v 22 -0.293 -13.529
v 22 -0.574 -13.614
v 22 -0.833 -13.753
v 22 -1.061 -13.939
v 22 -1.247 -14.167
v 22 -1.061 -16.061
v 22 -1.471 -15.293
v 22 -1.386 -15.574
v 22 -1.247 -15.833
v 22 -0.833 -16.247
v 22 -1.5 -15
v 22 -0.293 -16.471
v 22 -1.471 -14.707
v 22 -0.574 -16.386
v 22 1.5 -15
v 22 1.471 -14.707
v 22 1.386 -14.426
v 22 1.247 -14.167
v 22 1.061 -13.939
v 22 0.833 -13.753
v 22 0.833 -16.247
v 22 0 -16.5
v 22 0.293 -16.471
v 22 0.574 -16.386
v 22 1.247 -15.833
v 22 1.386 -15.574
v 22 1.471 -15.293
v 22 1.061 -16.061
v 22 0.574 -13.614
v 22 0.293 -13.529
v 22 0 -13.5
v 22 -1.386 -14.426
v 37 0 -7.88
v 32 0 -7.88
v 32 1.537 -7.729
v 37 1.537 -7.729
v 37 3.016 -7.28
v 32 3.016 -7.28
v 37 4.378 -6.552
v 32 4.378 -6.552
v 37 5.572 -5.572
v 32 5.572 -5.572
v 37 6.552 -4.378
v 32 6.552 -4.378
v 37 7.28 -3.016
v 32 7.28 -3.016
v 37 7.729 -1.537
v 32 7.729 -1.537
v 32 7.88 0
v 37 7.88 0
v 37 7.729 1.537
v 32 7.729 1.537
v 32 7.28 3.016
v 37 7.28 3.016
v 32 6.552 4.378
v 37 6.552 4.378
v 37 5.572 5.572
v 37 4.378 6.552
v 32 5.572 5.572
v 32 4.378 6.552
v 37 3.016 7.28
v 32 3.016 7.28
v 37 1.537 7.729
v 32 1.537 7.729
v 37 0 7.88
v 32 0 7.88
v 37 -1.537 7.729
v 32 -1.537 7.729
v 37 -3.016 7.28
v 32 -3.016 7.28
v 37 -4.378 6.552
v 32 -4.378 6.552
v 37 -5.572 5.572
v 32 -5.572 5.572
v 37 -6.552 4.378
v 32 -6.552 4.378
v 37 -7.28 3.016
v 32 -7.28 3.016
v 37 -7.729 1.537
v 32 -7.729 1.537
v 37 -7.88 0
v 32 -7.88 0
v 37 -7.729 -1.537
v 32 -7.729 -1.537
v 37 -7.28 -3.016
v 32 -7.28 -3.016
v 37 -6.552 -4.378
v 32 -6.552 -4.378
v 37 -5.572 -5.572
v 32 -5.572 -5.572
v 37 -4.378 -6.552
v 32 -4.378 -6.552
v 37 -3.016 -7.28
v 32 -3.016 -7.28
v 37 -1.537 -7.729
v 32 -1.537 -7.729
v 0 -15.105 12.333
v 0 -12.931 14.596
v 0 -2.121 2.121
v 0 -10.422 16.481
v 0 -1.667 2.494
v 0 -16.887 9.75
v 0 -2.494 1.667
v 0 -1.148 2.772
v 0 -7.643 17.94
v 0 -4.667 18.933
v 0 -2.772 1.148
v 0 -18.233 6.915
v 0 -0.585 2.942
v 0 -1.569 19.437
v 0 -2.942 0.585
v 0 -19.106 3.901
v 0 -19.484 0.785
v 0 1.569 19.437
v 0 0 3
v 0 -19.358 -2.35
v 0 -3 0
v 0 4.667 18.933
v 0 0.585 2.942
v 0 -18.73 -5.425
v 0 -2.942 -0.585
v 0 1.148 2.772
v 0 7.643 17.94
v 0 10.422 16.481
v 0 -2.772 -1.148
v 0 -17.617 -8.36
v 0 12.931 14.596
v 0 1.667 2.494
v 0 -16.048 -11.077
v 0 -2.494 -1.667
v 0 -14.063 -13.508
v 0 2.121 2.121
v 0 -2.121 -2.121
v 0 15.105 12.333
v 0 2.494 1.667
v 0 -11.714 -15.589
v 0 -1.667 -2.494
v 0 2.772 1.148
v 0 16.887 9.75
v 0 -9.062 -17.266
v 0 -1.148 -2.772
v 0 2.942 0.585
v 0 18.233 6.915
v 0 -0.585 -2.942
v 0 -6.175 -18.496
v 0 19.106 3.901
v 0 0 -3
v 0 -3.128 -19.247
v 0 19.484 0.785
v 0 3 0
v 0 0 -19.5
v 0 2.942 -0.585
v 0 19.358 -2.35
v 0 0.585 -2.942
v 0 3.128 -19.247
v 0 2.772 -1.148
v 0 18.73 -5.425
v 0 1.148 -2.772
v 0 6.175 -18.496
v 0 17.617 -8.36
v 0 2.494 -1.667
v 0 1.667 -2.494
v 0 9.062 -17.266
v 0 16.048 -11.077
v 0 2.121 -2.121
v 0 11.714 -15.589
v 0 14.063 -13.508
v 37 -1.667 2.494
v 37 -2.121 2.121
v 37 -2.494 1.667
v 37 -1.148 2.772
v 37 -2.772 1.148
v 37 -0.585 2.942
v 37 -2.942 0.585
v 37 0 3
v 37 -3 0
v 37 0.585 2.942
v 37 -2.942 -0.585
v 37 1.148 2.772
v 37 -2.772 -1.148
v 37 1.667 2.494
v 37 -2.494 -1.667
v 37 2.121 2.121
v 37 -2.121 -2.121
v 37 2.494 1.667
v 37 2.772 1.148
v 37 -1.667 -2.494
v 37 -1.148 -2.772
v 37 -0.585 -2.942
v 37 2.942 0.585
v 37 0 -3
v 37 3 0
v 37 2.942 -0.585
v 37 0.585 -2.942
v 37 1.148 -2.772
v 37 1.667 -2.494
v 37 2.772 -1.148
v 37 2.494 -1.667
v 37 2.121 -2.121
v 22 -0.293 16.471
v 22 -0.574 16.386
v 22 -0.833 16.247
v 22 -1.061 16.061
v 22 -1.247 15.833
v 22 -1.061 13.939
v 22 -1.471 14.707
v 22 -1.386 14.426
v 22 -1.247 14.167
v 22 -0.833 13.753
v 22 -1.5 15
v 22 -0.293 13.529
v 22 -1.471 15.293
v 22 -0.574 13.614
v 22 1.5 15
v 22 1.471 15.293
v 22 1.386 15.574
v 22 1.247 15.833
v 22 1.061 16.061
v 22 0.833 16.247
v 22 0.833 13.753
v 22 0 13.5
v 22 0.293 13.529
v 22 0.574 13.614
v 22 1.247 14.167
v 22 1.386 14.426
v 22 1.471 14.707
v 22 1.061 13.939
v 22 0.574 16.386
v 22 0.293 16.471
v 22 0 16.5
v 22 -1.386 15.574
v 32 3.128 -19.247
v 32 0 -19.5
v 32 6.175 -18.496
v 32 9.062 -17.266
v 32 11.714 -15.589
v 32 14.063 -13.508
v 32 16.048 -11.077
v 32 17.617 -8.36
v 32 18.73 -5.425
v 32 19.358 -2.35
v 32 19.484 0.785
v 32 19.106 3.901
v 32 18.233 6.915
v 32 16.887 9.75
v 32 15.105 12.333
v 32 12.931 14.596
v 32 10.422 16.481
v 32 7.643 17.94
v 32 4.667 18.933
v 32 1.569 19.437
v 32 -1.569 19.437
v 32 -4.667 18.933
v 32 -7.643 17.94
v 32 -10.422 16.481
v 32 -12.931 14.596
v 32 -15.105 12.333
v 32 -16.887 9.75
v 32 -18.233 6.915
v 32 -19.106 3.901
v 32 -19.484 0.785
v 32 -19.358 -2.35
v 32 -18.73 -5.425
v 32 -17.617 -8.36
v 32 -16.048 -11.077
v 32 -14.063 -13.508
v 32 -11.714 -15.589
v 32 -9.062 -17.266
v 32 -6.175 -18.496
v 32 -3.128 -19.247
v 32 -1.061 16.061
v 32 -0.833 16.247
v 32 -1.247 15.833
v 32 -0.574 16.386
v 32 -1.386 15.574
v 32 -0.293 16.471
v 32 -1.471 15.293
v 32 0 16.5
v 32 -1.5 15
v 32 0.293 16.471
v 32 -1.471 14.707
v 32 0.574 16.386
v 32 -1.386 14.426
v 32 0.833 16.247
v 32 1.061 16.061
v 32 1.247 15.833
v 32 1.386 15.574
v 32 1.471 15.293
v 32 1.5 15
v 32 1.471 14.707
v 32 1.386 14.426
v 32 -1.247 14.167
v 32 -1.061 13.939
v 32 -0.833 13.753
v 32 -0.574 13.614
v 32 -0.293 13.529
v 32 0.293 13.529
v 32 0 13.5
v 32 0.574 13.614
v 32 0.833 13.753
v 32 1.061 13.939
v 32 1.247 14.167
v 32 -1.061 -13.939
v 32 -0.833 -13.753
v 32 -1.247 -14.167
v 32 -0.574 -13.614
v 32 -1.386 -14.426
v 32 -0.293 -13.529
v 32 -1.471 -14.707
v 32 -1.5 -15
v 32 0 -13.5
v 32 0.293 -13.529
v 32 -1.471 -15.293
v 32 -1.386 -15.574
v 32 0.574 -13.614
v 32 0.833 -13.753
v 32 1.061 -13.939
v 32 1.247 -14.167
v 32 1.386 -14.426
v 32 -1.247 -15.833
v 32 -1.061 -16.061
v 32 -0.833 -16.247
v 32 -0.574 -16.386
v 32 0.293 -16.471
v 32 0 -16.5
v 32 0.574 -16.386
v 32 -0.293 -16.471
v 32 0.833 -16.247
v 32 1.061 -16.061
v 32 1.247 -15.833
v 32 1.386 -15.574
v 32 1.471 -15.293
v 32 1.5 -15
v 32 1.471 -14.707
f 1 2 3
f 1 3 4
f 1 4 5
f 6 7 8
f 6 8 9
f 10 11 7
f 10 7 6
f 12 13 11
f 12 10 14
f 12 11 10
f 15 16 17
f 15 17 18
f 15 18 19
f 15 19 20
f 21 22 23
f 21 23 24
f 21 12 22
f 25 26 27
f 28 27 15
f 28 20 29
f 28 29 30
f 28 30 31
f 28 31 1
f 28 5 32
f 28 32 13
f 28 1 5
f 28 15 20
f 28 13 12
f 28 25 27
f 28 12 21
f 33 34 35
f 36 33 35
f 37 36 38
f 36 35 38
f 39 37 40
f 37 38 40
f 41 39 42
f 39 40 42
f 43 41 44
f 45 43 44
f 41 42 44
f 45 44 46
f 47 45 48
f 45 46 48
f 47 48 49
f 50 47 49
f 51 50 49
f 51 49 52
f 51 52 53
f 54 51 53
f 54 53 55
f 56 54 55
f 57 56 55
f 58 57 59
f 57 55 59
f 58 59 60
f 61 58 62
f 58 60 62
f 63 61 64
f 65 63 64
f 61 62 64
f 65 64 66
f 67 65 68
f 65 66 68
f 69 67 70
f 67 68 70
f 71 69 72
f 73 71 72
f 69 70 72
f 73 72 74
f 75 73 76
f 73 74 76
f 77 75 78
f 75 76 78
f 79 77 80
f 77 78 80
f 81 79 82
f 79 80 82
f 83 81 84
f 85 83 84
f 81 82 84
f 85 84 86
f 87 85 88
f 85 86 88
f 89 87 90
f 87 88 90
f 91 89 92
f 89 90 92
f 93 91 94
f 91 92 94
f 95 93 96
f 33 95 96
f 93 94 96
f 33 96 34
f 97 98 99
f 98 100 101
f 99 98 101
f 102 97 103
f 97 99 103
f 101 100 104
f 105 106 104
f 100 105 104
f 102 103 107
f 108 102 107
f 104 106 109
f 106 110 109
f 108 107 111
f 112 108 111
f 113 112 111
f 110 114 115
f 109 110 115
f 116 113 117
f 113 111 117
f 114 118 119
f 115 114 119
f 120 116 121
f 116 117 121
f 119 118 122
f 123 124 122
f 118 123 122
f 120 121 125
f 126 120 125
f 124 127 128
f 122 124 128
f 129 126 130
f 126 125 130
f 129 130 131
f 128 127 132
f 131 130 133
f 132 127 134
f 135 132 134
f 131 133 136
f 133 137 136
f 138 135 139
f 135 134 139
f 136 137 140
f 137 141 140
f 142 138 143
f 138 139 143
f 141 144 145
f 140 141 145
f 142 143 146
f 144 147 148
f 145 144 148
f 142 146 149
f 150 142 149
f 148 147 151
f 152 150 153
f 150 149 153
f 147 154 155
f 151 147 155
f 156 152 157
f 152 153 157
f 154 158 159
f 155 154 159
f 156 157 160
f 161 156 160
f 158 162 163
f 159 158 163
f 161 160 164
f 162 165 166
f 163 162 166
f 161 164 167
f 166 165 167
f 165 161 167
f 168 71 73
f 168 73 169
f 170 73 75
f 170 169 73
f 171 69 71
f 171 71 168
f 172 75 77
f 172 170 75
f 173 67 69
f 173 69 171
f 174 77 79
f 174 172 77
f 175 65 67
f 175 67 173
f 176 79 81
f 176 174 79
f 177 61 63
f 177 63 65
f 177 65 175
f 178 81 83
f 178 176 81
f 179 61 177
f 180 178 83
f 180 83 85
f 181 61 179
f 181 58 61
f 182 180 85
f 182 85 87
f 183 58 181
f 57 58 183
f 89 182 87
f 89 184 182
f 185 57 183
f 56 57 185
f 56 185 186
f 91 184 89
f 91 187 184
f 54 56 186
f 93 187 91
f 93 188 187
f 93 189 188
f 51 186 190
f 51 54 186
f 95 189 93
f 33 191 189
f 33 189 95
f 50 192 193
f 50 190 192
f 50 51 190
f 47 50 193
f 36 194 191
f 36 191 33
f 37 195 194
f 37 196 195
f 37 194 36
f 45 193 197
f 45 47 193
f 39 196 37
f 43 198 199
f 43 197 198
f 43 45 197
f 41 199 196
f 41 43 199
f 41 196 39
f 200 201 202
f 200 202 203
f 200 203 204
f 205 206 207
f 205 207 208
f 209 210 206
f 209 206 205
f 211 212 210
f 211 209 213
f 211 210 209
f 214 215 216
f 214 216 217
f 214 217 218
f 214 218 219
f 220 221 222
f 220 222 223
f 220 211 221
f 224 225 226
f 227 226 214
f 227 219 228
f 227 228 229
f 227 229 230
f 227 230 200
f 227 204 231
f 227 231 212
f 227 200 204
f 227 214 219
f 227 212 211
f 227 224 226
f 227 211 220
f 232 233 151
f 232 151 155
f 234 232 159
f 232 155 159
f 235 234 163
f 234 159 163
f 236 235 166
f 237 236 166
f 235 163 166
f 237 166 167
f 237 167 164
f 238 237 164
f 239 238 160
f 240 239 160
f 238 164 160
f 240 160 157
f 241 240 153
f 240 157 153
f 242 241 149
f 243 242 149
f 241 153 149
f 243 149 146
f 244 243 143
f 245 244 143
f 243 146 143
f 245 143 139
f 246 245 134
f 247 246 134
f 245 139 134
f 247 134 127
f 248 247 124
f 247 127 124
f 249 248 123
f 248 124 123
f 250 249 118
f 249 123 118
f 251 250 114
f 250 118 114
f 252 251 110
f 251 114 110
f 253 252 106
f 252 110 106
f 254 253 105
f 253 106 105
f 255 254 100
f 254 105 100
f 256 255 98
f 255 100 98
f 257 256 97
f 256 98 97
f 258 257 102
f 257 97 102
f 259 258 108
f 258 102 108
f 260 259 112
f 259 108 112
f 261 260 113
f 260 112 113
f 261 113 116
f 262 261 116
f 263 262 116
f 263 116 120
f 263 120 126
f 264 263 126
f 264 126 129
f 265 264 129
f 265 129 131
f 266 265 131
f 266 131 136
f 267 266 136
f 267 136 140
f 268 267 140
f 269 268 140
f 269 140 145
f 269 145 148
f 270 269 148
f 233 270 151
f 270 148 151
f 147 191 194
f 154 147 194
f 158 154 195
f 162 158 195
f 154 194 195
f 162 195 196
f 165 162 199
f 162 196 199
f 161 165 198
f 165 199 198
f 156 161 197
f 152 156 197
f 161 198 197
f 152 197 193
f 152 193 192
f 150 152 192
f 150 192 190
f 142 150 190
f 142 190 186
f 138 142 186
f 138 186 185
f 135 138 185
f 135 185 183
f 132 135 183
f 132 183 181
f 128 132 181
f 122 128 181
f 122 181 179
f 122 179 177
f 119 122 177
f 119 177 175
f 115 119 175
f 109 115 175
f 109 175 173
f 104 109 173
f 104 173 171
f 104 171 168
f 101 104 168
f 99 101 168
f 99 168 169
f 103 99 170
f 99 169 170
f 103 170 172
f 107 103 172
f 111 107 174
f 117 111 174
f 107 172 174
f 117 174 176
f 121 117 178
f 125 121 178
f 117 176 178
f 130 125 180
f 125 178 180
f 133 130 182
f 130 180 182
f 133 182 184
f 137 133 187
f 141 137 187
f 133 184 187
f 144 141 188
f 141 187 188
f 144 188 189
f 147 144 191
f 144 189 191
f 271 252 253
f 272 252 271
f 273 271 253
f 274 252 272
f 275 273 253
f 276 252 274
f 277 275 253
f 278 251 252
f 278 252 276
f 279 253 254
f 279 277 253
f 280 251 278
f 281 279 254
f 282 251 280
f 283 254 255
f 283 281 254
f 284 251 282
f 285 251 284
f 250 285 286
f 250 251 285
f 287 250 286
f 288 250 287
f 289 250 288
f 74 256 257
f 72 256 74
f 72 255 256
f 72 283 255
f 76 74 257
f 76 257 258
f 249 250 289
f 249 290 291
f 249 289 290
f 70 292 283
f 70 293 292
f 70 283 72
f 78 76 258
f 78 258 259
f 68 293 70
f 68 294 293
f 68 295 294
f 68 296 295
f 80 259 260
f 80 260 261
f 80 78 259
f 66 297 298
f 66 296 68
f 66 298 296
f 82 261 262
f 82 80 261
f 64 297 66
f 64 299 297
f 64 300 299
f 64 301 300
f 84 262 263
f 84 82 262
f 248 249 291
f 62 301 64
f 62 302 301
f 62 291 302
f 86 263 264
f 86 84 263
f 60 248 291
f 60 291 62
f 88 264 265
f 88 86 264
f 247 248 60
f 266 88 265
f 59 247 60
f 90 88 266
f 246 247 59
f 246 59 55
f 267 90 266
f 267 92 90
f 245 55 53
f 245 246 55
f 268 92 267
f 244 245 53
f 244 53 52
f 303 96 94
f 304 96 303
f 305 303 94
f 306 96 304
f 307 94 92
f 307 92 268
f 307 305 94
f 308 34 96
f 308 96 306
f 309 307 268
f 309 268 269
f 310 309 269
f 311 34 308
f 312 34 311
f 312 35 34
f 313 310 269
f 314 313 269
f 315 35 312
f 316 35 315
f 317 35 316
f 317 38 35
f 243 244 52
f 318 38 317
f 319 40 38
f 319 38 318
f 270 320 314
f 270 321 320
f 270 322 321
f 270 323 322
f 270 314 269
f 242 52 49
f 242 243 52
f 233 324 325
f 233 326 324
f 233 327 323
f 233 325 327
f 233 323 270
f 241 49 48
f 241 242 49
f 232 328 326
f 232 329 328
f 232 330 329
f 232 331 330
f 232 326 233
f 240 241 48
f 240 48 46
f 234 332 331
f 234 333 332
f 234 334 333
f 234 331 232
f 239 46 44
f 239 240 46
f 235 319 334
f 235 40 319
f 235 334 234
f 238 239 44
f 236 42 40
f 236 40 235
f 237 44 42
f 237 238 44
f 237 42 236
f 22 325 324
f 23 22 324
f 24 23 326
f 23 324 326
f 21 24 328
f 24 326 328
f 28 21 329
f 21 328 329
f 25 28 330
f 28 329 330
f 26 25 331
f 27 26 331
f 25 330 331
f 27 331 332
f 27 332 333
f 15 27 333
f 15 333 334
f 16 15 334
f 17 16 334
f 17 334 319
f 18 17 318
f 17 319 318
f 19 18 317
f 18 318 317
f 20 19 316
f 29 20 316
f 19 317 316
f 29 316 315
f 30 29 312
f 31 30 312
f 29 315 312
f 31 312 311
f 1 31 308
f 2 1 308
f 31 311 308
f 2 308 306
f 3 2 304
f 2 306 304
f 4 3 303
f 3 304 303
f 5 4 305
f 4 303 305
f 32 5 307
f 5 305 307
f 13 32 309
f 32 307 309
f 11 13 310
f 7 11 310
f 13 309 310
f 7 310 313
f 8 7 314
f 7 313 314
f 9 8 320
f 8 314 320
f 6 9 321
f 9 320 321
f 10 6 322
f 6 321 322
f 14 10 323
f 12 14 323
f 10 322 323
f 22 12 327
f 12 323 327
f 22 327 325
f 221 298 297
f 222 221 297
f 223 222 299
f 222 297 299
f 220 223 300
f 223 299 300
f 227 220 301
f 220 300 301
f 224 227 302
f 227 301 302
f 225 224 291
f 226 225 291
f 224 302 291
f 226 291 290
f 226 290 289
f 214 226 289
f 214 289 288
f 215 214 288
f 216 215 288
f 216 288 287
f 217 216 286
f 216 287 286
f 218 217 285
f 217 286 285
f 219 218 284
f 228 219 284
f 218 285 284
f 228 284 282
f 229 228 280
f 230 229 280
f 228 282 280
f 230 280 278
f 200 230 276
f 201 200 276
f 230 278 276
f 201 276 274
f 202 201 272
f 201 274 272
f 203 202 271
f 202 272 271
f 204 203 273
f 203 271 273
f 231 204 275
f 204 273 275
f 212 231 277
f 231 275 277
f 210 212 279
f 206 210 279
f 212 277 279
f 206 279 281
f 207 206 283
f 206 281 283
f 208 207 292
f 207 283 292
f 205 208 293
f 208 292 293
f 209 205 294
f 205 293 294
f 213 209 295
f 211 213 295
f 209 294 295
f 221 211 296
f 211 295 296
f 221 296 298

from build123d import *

# Parameters (mm, degrees)
SKETCH_1_R          = 19.5
EXTRUDE_1_DEPTH     = 32
SKETCH_2_R          = 7.88
EXTRUDE_2_DEPTH     = 5
CUT_EXTRUDE_1_REACH = 48.147
SKETCH_3_R          = 3
SKETCH_4_R          = 1.5
CUT_EXTRUDE_2_DEPTH = 10


with BuildPart() as part:
    # 草图1 → 凸台-拉伸1 (new body)
    with BuildSketch(Plane(origin=(0, 0, 0), x_dir=(0, 0, -1), z_dir=(1, 0, 0))):
        Circle(SKETCH_1_R)
    extrude(amount=EXTRUDE_1_DEPTH)

    # 草图2 → 凸台-拉伸2 (add)
    with BuildSketch(Plane(origin=(32, 0, 0), x_dir=(0, 0, -1), z_dir=(1, 0, 0))):
        Circle(SKETCH_2_R)
    extrude(amount=EXTRUDE_2_DEPTH)

    # 草图3 → 切除-拉伸1 (cut, up to next)
    with BuildSketch(Plane(origin=(37, 0, 0), x_dir=(0, 0, -1), z_dir=(1, 0, 0)), mode=Mode.PRIVATE) as cut_extrude_1_sk1:
        Circle(SKETCH_3_R)
    cut_extrude_1_tool1 = extrude(cut_extrude_1_sk1.sketch, amount=-CUT_EXTRUDE_1_REACH, mode=Mode.PRIVATE) & part.part
    add(cut_extrude_1_tool1.solids().sort_by_distance((37, 0, 0))[0], mode=Mode.SUBTRACT)

    # 草图4 → 切除-拉伸2 (cut)
    with BuildSketch(Plane(origin=(32, 0, 0), x_dir=(0, 0, -1), z_dir=(1, 0, 0))):
        with Locations((15, 0)):
            Circle(SKETCH_4_R)
        with Locations((-15, 0)):
            Circle(SKETCH_4_R)
    extrude(amount=-CUT_EXTRUDE_2_DEPTH, mode=Mode.SUBTRACT)


solid = part.part
